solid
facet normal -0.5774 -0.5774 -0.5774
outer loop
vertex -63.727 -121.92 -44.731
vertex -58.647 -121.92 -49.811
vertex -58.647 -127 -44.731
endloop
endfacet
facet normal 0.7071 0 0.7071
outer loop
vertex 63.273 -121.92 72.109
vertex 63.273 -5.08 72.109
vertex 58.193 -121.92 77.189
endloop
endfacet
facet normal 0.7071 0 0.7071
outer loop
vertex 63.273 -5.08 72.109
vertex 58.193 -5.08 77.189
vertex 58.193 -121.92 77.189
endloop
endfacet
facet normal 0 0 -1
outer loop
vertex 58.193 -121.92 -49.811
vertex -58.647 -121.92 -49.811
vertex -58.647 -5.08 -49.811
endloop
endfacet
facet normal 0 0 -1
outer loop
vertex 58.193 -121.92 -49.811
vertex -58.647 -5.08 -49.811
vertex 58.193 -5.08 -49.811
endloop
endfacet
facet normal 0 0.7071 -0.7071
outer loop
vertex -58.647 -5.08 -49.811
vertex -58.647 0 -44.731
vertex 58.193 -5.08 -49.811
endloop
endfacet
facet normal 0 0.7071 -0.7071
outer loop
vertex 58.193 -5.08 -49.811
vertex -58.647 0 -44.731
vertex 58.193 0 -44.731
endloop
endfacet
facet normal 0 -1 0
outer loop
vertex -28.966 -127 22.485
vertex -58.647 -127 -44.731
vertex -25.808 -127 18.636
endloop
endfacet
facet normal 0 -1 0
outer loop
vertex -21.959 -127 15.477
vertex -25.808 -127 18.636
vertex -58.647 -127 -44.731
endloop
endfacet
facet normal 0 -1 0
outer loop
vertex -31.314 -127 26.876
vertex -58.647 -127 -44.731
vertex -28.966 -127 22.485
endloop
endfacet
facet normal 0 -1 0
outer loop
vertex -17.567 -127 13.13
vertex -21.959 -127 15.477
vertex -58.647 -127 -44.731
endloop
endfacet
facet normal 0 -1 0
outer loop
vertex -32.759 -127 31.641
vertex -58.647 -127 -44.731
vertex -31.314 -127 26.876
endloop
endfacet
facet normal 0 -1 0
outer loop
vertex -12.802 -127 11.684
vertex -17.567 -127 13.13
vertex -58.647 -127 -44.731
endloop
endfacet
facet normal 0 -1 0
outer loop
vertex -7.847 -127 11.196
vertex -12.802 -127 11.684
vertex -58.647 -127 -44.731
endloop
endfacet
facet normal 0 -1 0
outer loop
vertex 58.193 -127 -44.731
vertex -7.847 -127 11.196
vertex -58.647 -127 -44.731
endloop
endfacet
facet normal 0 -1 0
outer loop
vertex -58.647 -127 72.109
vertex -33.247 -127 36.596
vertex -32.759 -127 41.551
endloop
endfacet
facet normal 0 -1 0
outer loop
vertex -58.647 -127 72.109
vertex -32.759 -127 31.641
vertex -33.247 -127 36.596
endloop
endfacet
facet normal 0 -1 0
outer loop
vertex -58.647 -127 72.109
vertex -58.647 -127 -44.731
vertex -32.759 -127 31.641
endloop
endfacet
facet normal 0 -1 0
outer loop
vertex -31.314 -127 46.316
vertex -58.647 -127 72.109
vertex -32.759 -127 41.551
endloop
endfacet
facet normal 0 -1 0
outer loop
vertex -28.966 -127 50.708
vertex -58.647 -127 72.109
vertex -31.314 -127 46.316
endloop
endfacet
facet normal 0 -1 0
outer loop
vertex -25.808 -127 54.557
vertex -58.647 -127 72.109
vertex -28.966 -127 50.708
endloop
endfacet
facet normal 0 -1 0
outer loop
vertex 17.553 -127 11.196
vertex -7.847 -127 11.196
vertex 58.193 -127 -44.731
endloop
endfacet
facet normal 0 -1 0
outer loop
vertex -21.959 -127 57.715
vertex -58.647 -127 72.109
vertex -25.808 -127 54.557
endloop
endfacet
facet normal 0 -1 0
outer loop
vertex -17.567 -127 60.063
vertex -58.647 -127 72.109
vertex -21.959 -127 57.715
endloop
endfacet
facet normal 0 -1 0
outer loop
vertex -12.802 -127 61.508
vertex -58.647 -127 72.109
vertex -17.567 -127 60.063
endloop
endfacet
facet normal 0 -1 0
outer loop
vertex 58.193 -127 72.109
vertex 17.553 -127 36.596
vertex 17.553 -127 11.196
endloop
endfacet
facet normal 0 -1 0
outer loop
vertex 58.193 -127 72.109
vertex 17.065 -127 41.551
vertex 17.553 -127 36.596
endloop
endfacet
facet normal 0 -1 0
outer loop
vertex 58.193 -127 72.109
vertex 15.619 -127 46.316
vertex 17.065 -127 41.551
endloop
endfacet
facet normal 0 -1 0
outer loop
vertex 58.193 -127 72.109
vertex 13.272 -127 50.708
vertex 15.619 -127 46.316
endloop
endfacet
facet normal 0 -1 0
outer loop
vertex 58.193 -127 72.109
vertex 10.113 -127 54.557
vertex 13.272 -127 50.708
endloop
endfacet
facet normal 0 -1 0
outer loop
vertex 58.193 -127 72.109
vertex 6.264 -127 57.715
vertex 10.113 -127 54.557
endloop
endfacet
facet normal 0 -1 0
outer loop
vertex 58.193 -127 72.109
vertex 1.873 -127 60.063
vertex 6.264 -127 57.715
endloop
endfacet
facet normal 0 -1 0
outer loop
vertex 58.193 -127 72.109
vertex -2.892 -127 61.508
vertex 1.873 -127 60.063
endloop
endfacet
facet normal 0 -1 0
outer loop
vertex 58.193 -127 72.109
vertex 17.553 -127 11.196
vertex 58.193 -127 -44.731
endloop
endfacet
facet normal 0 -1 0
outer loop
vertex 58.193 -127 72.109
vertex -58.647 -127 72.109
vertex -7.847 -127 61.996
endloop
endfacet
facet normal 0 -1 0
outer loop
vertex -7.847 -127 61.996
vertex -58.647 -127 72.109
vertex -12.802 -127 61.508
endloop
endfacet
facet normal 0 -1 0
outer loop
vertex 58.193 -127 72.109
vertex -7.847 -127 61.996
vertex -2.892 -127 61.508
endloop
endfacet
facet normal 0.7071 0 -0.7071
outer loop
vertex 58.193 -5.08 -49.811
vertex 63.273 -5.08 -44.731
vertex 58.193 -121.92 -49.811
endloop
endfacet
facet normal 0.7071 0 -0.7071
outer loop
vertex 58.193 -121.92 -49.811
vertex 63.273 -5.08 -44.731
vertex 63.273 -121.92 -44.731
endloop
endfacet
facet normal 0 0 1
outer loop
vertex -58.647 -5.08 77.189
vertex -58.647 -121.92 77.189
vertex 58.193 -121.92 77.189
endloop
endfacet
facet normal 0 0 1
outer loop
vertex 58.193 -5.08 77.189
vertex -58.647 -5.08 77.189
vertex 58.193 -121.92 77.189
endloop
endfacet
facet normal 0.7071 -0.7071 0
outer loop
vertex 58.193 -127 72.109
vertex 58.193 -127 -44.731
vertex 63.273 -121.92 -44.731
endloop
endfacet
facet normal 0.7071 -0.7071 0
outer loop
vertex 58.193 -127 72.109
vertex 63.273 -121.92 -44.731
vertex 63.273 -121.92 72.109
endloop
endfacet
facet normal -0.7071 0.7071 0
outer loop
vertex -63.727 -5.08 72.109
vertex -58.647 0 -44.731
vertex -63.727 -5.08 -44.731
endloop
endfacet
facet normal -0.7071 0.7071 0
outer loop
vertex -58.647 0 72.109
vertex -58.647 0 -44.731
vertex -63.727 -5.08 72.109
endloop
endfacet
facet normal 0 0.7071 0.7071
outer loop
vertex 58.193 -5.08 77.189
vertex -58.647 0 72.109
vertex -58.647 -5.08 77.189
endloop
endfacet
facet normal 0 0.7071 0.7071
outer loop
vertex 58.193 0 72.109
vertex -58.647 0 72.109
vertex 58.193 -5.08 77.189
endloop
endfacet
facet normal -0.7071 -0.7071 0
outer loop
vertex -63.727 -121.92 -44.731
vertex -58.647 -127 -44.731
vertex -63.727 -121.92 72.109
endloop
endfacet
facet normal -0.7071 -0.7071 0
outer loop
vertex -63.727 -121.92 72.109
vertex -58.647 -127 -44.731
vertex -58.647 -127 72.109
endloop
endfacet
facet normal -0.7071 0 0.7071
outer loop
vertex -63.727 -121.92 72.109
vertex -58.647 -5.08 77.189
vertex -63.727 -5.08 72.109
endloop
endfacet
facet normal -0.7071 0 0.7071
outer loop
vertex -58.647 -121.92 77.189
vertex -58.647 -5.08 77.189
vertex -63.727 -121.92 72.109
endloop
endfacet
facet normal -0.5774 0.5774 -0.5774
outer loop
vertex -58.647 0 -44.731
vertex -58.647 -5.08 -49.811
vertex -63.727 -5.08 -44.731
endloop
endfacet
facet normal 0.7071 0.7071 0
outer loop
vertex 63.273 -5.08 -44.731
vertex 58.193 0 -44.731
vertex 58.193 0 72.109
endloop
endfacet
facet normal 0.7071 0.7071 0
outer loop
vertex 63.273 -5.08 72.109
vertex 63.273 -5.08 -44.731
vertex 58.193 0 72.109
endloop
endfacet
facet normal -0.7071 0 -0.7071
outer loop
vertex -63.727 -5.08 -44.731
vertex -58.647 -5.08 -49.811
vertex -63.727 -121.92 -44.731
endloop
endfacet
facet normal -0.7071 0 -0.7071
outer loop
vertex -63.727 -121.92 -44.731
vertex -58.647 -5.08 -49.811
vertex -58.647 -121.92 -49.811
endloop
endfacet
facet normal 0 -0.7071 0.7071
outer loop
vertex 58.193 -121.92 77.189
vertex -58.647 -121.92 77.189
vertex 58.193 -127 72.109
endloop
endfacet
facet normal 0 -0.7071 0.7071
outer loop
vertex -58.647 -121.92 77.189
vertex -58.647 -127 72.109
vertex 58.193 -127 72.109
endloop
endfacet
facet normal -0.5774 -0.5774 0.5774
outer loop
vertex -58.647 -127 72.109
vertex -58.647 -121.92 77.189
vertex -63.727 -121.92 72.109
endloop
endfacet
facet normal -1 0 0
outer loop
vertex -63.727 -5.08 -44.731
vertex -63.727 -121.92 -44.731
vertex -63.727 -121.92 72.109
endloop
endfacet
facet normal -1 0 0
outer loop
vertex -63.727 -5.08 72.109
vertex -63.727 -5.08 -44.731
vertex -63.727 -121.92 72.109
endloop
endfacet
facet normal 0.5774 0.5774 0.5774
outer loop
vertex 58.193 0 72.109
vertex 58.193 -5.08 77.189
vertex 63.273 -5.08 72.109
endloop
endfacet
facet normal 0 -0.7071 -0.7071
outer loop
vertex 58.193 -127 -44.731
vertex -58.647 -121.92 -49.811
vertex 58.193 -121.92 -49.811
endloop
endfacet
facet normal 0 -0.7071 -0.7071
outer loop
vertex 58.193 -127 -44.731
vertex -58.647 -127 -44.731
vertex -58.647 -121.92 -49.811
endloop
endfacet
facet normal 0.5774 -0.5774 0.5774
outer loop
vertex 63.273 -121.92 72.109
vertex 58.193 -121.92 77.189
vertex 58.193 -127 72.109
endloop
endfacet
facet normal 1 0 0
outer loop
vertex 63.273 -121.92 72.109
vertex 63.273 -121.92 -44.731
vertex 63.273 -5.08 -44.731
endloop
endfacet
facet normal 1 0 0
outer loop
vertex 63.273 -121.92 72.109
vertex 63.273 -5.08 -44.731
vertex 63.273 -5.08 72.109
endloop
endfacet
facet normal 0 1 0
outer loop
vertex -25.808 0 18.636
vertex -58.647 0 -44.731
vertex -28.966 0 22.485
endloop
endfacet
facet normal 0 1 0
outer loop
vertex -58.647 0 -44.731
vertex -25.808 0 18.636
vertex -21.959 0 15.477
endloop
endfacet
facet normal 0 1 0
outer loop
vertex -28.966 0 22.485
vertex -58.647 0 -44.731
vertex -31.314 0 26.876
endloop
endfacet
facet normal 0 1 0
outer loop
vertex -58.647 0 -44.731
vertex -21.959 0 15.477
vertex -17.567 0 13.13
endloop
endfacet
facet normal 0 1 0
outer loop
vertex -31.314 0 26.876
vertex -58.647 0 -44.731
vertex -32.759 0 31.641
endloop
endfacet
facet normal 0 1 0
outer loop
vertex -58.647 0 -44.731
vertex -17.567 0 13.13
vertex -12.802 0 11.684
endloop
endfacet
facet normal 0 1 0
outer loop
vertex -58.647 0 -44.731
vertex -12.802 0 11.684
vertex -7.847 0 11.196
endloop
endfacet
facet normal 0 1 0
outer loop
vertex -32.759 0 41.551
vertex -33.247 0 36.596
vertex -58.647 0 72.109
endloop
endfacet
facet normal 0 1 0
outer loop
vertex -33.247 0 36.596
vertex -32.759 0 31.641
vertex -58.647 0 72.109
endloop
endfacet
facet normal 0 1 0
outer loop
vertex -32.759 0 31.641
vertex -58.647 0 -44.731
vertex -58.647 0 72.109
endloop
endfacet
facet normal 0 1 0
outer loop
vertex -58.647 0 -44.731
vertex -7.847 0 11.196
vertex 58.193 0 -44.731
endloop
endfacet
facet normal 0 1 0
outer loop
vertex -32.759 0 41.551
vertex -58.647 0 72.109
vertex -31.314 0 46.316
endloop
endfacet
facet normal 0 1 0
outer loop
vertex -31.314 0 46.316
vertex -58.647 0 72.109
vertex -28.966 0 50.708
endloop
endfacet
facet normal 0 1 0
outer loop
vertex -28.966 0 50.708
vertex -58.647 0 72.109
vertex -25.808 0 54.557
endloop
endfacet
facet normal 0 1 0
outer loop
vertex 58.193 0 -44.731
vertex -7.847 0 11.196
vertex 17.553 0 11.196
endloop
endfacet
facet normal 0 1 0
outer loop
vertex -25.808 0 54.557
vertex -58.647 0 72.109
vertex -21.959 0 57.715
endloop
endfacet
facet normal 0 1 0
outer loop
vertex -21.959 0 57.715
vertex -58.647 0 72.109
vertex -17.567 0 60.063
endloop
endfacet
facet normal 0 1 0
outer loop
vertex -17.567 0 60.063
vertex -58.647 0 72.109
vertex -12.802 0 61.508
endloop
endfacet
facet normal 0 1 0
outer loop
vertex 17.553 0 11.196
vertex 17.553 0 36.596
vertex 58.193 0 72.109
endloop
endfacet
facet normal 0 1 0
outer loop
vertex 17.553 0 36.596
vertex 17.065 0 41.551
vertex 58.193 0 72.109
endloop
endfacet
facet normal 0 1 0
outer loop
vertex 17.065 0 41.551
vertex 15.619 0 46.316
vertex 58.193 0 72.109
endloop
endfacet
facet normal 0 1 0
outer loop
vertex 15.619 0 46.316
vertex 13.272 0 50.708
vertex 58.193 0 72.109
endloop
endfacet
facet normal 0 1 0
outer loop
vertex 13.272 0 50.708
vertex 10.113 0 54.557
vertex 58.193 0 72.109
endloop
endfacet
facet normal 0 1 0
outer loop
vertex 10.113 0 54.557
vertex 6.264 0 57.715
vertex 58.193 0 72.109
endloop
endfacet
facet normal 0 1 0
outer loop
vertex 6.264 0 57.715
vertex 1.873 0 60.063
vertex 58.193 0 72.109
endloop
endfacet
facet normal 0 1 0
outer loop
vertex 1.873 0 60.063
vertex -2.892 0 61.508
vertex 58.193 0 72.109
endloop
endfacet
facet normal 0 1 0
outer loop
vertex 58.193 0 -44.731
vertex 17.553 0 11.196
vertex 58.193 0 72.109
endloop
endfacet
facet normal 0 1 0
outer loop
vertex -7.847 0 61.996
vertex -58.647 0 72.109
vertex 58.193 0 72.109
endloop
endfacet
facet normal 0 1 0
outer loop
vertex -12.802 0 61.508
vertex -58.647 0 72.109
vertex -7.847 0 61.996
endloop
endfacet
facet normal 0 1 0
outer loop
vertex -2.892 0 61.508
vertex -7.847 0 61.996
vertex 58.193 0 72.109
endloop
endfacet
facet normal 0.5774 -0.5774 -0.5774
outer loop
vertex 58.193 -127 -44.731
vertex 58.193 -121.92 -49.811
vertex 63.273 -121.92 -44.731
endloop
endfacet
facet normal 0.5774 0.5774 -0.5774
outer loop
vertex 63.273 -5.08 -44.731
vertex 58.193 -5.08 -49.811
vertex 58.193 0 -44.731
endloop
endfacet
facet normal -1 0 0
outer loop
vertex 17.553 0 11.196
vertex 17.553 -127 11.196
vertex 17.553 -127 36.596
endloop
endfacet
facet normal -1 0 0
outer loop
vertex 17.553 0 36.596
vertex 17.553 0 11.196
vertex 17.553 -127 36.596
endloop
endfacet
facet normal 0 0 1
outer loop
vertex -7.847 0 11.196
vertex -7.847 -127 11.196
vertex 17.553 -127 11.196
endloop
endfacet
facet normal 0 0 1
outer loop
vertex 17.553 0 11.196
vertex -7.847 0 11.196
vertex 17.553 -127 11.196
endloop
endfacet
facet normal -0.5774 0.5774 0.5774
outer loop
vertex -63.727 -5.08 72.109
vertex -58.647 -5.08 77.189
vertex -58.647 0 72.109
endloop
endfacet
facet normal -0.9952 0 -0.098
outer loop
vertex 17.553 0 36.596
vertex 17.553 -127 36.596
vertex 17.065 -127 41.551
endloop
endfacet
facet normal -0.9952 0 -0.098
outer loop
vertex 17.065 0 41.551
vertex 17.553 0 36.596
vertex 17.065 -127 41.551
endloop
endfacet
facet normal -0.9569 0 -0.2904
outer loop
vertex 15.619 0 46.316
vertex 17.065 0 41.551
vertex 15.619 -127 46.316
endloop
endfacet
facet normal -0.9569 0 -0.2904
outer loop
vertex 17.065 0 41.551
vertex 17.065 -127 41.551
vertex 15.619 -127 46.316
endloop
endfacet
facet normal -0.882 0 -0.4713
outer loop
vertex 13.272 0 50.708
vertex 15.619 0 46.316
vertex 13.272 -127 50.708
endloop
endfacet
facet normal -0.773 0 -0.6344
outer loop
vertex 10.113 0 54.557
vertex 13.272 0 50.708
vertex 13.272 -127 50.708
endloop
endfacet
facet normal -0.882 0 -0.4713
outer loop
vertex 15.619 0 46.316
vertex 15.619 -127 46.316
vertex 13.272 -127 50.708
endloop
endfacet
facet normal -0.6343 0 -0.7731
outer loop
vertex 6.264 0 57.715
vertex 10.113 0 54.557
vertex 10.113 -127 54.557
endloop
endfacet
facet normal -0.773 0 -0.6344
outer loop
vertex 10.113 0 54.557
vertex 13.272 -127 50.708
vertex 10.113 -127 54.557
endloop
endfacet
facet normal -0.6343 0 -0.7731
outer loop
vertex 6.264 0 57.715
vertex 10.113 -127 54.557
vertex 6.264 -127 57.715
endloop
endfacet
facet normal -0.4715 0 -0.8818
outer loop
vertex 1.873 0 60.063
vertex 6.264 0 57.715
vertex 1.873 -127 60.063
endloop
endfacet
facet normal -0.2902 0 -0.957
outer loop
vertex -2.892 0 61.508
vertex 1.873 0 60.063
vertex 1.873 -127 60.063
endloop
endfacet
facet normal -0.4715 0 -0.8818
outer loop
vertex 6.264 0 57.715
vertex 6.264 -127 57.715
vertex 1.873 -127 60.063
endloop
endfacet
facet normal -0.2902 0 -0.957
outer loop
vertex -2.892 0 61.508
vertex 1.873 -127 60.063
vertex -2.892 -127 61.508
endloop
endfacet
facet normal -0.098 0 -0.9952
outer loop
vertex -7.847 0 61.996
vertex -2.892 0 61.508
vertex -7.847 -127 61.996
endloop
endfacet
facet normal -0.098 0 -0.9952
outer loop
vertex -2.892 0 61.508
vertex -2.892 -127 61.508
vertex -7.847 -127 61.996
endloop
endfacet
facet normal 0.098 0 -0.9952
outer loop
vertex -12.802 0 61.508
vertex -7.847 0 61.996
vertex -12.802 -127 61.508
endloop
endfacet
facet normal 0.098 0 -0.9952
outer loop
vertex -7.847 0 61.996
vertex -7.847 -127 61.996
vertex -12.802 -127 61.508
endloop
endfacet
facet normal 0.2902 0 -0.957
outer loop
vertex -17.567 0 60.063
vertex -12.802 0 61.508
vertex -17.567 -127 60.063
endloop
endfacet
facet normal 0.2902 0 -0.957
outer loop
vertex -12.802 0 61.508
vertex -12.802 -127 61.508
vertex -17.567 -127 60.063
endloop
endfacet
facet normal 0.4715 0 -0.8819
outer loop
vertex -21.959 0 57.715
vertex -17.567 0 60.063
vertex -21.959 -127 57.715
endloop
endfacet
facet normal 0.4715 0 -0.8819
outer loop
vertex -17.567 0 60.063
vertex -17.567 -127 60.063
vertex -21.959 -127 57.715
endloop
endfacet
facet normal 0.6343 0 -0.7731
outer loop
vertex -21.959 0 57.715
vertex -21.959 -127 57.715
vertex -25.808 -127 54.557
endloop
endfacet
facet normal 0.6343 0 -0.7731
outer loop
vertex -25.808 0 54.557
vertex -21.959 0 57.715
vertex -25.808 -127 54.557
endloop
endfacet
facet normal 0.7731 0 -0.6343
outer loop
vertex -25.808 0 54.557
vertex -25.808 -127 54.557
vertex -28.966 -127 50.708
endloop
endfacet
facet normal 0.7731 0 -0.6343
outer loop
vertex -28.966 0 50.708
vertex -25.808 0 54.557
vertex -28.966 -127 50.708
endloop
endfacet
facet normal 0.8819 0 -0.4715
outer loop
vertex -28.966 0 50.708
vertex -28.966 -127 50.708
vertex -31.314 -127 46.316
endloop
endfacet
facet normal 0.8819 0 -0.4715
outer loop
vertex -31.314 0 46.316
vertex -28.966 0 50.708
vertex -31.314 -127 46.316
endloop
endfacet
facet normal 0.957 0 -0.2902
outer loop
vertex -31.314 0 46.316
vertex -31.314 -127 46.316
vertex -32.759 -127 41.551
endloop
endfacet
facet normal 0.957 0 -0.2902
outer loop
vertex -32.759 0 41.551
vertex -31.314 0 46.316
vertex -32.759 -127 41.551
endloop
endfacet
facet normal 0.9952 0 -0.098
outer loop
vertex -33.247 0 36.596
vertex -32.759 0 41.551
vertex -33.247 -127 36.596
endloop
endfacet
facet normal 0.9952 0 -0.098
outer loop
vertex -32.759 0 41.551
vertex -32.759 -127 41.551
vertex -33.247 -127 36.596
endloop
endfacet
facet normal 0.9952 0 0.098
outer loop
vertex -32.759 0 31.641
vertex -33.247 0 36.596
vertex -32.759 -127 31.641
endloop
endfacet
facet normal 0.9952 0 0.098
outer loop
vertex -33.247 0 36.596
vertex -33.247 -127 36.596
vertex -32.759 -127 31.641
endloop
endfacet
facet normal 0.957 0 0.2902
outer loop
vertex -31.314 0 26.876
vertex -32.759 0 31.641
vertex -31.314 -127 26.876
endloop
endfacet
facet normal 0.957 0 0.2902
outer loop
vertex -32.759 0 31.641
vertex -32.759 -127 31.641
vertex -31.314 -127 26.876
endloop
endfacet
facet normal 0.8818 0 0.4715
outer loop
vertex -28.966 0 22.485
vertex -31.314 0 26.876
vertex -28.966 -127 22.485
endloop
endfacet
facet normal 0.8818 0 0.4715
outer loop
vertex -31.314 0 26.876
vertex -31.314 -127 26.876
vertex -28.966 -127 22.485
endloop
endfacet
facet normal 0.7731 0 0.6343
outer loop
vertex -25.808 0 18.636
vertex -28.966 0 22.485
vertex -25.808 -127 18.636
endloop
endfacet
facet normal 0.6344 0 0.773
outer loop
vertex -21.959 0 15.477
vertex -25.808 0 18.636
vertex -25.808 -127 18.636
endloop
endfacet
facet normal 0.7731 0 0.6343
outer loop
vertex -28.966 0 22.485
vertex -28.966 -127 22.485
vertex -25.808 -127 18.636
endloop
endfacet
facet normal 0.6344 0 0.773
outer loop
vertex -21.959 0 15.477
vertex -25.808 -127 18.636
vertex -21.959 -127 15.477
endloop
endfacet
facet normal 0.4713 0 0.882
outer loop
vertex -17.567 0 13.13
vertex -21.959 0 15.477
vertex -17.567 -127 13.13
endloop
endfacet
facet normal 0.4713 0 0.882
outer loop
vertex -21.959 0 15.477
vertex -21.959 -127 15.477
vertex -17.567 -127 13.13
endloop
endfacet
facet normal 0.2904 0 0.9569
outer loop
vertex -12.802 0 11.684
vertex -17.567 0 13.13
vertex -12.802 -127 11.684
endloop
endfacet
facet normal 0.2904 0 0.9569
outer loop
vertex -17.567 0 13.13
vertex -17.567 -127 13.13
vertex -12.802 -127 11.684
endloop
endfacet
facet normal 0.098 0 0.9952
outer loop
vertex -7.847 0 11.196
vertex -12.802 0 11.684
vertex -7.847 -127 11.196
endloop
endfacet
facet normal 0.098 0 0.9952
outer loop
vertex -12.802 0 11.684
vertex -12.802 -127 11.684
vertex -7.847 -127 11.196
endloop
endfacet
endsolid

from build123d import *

# Parameters (mm, degrees)
F0_W     = 127
F0_H     = 127
F1_DEPTH = 127
F2_SIZE  = 5.08
F4_DEPTH = 127


with BuildPart() as f1:
    # F0 (on Front) → F1 (new body)
    with BuildSketch(Plane.XZ):
        with Locations((-0.227161, 13.688557)):
            Rectangle(F0_W, F0_H)
    extrude(amount=F1_DEPTH)

    # F2
    f2_edges = [f1.edges().sort_by_distance(p)[0] for p in [
        (-0.227161, -127, 77.188557),
        (63.272839, -63.5, 77.188557),
        (63.272839, -63.5, -49.811443),
        (-0.227161, -127, -49.811443),
        (-63.727161, -63.5, -49.811443),
        (-0.227161, 0, -49.811443),
        (-63.727161, -63.5, 77.188557),
        (-0.227161, 0, 77.188557),
        (-63.727161, 0, 13.688557),
        (63.272839, 0, 13.688557),
        (-63.727161, -127, 13.688557),
        (63.272839, -127, 13.688557),
    ]]
    chamfer(f2_edges, length=F2_SIZE)

    # F3 (on face) → F4 (cut)
    with BuildSketch(Plane.XZ.offset(127)):
        with BuildLine():
            Line((17.552839, 11.196052), (17.552839, 36.596052))
            ThreePointArc((17.552839, 36.596052), (-25.807673, 54.556565), (-7.847161, 11.196052))
            Line((-7.847161, 11.196052), (17.552839, 11.196052))
        make_face()
    extrude(amount=-F4_DEPTH, mode=Mode.SUBTRACT)


solid = f1.part
